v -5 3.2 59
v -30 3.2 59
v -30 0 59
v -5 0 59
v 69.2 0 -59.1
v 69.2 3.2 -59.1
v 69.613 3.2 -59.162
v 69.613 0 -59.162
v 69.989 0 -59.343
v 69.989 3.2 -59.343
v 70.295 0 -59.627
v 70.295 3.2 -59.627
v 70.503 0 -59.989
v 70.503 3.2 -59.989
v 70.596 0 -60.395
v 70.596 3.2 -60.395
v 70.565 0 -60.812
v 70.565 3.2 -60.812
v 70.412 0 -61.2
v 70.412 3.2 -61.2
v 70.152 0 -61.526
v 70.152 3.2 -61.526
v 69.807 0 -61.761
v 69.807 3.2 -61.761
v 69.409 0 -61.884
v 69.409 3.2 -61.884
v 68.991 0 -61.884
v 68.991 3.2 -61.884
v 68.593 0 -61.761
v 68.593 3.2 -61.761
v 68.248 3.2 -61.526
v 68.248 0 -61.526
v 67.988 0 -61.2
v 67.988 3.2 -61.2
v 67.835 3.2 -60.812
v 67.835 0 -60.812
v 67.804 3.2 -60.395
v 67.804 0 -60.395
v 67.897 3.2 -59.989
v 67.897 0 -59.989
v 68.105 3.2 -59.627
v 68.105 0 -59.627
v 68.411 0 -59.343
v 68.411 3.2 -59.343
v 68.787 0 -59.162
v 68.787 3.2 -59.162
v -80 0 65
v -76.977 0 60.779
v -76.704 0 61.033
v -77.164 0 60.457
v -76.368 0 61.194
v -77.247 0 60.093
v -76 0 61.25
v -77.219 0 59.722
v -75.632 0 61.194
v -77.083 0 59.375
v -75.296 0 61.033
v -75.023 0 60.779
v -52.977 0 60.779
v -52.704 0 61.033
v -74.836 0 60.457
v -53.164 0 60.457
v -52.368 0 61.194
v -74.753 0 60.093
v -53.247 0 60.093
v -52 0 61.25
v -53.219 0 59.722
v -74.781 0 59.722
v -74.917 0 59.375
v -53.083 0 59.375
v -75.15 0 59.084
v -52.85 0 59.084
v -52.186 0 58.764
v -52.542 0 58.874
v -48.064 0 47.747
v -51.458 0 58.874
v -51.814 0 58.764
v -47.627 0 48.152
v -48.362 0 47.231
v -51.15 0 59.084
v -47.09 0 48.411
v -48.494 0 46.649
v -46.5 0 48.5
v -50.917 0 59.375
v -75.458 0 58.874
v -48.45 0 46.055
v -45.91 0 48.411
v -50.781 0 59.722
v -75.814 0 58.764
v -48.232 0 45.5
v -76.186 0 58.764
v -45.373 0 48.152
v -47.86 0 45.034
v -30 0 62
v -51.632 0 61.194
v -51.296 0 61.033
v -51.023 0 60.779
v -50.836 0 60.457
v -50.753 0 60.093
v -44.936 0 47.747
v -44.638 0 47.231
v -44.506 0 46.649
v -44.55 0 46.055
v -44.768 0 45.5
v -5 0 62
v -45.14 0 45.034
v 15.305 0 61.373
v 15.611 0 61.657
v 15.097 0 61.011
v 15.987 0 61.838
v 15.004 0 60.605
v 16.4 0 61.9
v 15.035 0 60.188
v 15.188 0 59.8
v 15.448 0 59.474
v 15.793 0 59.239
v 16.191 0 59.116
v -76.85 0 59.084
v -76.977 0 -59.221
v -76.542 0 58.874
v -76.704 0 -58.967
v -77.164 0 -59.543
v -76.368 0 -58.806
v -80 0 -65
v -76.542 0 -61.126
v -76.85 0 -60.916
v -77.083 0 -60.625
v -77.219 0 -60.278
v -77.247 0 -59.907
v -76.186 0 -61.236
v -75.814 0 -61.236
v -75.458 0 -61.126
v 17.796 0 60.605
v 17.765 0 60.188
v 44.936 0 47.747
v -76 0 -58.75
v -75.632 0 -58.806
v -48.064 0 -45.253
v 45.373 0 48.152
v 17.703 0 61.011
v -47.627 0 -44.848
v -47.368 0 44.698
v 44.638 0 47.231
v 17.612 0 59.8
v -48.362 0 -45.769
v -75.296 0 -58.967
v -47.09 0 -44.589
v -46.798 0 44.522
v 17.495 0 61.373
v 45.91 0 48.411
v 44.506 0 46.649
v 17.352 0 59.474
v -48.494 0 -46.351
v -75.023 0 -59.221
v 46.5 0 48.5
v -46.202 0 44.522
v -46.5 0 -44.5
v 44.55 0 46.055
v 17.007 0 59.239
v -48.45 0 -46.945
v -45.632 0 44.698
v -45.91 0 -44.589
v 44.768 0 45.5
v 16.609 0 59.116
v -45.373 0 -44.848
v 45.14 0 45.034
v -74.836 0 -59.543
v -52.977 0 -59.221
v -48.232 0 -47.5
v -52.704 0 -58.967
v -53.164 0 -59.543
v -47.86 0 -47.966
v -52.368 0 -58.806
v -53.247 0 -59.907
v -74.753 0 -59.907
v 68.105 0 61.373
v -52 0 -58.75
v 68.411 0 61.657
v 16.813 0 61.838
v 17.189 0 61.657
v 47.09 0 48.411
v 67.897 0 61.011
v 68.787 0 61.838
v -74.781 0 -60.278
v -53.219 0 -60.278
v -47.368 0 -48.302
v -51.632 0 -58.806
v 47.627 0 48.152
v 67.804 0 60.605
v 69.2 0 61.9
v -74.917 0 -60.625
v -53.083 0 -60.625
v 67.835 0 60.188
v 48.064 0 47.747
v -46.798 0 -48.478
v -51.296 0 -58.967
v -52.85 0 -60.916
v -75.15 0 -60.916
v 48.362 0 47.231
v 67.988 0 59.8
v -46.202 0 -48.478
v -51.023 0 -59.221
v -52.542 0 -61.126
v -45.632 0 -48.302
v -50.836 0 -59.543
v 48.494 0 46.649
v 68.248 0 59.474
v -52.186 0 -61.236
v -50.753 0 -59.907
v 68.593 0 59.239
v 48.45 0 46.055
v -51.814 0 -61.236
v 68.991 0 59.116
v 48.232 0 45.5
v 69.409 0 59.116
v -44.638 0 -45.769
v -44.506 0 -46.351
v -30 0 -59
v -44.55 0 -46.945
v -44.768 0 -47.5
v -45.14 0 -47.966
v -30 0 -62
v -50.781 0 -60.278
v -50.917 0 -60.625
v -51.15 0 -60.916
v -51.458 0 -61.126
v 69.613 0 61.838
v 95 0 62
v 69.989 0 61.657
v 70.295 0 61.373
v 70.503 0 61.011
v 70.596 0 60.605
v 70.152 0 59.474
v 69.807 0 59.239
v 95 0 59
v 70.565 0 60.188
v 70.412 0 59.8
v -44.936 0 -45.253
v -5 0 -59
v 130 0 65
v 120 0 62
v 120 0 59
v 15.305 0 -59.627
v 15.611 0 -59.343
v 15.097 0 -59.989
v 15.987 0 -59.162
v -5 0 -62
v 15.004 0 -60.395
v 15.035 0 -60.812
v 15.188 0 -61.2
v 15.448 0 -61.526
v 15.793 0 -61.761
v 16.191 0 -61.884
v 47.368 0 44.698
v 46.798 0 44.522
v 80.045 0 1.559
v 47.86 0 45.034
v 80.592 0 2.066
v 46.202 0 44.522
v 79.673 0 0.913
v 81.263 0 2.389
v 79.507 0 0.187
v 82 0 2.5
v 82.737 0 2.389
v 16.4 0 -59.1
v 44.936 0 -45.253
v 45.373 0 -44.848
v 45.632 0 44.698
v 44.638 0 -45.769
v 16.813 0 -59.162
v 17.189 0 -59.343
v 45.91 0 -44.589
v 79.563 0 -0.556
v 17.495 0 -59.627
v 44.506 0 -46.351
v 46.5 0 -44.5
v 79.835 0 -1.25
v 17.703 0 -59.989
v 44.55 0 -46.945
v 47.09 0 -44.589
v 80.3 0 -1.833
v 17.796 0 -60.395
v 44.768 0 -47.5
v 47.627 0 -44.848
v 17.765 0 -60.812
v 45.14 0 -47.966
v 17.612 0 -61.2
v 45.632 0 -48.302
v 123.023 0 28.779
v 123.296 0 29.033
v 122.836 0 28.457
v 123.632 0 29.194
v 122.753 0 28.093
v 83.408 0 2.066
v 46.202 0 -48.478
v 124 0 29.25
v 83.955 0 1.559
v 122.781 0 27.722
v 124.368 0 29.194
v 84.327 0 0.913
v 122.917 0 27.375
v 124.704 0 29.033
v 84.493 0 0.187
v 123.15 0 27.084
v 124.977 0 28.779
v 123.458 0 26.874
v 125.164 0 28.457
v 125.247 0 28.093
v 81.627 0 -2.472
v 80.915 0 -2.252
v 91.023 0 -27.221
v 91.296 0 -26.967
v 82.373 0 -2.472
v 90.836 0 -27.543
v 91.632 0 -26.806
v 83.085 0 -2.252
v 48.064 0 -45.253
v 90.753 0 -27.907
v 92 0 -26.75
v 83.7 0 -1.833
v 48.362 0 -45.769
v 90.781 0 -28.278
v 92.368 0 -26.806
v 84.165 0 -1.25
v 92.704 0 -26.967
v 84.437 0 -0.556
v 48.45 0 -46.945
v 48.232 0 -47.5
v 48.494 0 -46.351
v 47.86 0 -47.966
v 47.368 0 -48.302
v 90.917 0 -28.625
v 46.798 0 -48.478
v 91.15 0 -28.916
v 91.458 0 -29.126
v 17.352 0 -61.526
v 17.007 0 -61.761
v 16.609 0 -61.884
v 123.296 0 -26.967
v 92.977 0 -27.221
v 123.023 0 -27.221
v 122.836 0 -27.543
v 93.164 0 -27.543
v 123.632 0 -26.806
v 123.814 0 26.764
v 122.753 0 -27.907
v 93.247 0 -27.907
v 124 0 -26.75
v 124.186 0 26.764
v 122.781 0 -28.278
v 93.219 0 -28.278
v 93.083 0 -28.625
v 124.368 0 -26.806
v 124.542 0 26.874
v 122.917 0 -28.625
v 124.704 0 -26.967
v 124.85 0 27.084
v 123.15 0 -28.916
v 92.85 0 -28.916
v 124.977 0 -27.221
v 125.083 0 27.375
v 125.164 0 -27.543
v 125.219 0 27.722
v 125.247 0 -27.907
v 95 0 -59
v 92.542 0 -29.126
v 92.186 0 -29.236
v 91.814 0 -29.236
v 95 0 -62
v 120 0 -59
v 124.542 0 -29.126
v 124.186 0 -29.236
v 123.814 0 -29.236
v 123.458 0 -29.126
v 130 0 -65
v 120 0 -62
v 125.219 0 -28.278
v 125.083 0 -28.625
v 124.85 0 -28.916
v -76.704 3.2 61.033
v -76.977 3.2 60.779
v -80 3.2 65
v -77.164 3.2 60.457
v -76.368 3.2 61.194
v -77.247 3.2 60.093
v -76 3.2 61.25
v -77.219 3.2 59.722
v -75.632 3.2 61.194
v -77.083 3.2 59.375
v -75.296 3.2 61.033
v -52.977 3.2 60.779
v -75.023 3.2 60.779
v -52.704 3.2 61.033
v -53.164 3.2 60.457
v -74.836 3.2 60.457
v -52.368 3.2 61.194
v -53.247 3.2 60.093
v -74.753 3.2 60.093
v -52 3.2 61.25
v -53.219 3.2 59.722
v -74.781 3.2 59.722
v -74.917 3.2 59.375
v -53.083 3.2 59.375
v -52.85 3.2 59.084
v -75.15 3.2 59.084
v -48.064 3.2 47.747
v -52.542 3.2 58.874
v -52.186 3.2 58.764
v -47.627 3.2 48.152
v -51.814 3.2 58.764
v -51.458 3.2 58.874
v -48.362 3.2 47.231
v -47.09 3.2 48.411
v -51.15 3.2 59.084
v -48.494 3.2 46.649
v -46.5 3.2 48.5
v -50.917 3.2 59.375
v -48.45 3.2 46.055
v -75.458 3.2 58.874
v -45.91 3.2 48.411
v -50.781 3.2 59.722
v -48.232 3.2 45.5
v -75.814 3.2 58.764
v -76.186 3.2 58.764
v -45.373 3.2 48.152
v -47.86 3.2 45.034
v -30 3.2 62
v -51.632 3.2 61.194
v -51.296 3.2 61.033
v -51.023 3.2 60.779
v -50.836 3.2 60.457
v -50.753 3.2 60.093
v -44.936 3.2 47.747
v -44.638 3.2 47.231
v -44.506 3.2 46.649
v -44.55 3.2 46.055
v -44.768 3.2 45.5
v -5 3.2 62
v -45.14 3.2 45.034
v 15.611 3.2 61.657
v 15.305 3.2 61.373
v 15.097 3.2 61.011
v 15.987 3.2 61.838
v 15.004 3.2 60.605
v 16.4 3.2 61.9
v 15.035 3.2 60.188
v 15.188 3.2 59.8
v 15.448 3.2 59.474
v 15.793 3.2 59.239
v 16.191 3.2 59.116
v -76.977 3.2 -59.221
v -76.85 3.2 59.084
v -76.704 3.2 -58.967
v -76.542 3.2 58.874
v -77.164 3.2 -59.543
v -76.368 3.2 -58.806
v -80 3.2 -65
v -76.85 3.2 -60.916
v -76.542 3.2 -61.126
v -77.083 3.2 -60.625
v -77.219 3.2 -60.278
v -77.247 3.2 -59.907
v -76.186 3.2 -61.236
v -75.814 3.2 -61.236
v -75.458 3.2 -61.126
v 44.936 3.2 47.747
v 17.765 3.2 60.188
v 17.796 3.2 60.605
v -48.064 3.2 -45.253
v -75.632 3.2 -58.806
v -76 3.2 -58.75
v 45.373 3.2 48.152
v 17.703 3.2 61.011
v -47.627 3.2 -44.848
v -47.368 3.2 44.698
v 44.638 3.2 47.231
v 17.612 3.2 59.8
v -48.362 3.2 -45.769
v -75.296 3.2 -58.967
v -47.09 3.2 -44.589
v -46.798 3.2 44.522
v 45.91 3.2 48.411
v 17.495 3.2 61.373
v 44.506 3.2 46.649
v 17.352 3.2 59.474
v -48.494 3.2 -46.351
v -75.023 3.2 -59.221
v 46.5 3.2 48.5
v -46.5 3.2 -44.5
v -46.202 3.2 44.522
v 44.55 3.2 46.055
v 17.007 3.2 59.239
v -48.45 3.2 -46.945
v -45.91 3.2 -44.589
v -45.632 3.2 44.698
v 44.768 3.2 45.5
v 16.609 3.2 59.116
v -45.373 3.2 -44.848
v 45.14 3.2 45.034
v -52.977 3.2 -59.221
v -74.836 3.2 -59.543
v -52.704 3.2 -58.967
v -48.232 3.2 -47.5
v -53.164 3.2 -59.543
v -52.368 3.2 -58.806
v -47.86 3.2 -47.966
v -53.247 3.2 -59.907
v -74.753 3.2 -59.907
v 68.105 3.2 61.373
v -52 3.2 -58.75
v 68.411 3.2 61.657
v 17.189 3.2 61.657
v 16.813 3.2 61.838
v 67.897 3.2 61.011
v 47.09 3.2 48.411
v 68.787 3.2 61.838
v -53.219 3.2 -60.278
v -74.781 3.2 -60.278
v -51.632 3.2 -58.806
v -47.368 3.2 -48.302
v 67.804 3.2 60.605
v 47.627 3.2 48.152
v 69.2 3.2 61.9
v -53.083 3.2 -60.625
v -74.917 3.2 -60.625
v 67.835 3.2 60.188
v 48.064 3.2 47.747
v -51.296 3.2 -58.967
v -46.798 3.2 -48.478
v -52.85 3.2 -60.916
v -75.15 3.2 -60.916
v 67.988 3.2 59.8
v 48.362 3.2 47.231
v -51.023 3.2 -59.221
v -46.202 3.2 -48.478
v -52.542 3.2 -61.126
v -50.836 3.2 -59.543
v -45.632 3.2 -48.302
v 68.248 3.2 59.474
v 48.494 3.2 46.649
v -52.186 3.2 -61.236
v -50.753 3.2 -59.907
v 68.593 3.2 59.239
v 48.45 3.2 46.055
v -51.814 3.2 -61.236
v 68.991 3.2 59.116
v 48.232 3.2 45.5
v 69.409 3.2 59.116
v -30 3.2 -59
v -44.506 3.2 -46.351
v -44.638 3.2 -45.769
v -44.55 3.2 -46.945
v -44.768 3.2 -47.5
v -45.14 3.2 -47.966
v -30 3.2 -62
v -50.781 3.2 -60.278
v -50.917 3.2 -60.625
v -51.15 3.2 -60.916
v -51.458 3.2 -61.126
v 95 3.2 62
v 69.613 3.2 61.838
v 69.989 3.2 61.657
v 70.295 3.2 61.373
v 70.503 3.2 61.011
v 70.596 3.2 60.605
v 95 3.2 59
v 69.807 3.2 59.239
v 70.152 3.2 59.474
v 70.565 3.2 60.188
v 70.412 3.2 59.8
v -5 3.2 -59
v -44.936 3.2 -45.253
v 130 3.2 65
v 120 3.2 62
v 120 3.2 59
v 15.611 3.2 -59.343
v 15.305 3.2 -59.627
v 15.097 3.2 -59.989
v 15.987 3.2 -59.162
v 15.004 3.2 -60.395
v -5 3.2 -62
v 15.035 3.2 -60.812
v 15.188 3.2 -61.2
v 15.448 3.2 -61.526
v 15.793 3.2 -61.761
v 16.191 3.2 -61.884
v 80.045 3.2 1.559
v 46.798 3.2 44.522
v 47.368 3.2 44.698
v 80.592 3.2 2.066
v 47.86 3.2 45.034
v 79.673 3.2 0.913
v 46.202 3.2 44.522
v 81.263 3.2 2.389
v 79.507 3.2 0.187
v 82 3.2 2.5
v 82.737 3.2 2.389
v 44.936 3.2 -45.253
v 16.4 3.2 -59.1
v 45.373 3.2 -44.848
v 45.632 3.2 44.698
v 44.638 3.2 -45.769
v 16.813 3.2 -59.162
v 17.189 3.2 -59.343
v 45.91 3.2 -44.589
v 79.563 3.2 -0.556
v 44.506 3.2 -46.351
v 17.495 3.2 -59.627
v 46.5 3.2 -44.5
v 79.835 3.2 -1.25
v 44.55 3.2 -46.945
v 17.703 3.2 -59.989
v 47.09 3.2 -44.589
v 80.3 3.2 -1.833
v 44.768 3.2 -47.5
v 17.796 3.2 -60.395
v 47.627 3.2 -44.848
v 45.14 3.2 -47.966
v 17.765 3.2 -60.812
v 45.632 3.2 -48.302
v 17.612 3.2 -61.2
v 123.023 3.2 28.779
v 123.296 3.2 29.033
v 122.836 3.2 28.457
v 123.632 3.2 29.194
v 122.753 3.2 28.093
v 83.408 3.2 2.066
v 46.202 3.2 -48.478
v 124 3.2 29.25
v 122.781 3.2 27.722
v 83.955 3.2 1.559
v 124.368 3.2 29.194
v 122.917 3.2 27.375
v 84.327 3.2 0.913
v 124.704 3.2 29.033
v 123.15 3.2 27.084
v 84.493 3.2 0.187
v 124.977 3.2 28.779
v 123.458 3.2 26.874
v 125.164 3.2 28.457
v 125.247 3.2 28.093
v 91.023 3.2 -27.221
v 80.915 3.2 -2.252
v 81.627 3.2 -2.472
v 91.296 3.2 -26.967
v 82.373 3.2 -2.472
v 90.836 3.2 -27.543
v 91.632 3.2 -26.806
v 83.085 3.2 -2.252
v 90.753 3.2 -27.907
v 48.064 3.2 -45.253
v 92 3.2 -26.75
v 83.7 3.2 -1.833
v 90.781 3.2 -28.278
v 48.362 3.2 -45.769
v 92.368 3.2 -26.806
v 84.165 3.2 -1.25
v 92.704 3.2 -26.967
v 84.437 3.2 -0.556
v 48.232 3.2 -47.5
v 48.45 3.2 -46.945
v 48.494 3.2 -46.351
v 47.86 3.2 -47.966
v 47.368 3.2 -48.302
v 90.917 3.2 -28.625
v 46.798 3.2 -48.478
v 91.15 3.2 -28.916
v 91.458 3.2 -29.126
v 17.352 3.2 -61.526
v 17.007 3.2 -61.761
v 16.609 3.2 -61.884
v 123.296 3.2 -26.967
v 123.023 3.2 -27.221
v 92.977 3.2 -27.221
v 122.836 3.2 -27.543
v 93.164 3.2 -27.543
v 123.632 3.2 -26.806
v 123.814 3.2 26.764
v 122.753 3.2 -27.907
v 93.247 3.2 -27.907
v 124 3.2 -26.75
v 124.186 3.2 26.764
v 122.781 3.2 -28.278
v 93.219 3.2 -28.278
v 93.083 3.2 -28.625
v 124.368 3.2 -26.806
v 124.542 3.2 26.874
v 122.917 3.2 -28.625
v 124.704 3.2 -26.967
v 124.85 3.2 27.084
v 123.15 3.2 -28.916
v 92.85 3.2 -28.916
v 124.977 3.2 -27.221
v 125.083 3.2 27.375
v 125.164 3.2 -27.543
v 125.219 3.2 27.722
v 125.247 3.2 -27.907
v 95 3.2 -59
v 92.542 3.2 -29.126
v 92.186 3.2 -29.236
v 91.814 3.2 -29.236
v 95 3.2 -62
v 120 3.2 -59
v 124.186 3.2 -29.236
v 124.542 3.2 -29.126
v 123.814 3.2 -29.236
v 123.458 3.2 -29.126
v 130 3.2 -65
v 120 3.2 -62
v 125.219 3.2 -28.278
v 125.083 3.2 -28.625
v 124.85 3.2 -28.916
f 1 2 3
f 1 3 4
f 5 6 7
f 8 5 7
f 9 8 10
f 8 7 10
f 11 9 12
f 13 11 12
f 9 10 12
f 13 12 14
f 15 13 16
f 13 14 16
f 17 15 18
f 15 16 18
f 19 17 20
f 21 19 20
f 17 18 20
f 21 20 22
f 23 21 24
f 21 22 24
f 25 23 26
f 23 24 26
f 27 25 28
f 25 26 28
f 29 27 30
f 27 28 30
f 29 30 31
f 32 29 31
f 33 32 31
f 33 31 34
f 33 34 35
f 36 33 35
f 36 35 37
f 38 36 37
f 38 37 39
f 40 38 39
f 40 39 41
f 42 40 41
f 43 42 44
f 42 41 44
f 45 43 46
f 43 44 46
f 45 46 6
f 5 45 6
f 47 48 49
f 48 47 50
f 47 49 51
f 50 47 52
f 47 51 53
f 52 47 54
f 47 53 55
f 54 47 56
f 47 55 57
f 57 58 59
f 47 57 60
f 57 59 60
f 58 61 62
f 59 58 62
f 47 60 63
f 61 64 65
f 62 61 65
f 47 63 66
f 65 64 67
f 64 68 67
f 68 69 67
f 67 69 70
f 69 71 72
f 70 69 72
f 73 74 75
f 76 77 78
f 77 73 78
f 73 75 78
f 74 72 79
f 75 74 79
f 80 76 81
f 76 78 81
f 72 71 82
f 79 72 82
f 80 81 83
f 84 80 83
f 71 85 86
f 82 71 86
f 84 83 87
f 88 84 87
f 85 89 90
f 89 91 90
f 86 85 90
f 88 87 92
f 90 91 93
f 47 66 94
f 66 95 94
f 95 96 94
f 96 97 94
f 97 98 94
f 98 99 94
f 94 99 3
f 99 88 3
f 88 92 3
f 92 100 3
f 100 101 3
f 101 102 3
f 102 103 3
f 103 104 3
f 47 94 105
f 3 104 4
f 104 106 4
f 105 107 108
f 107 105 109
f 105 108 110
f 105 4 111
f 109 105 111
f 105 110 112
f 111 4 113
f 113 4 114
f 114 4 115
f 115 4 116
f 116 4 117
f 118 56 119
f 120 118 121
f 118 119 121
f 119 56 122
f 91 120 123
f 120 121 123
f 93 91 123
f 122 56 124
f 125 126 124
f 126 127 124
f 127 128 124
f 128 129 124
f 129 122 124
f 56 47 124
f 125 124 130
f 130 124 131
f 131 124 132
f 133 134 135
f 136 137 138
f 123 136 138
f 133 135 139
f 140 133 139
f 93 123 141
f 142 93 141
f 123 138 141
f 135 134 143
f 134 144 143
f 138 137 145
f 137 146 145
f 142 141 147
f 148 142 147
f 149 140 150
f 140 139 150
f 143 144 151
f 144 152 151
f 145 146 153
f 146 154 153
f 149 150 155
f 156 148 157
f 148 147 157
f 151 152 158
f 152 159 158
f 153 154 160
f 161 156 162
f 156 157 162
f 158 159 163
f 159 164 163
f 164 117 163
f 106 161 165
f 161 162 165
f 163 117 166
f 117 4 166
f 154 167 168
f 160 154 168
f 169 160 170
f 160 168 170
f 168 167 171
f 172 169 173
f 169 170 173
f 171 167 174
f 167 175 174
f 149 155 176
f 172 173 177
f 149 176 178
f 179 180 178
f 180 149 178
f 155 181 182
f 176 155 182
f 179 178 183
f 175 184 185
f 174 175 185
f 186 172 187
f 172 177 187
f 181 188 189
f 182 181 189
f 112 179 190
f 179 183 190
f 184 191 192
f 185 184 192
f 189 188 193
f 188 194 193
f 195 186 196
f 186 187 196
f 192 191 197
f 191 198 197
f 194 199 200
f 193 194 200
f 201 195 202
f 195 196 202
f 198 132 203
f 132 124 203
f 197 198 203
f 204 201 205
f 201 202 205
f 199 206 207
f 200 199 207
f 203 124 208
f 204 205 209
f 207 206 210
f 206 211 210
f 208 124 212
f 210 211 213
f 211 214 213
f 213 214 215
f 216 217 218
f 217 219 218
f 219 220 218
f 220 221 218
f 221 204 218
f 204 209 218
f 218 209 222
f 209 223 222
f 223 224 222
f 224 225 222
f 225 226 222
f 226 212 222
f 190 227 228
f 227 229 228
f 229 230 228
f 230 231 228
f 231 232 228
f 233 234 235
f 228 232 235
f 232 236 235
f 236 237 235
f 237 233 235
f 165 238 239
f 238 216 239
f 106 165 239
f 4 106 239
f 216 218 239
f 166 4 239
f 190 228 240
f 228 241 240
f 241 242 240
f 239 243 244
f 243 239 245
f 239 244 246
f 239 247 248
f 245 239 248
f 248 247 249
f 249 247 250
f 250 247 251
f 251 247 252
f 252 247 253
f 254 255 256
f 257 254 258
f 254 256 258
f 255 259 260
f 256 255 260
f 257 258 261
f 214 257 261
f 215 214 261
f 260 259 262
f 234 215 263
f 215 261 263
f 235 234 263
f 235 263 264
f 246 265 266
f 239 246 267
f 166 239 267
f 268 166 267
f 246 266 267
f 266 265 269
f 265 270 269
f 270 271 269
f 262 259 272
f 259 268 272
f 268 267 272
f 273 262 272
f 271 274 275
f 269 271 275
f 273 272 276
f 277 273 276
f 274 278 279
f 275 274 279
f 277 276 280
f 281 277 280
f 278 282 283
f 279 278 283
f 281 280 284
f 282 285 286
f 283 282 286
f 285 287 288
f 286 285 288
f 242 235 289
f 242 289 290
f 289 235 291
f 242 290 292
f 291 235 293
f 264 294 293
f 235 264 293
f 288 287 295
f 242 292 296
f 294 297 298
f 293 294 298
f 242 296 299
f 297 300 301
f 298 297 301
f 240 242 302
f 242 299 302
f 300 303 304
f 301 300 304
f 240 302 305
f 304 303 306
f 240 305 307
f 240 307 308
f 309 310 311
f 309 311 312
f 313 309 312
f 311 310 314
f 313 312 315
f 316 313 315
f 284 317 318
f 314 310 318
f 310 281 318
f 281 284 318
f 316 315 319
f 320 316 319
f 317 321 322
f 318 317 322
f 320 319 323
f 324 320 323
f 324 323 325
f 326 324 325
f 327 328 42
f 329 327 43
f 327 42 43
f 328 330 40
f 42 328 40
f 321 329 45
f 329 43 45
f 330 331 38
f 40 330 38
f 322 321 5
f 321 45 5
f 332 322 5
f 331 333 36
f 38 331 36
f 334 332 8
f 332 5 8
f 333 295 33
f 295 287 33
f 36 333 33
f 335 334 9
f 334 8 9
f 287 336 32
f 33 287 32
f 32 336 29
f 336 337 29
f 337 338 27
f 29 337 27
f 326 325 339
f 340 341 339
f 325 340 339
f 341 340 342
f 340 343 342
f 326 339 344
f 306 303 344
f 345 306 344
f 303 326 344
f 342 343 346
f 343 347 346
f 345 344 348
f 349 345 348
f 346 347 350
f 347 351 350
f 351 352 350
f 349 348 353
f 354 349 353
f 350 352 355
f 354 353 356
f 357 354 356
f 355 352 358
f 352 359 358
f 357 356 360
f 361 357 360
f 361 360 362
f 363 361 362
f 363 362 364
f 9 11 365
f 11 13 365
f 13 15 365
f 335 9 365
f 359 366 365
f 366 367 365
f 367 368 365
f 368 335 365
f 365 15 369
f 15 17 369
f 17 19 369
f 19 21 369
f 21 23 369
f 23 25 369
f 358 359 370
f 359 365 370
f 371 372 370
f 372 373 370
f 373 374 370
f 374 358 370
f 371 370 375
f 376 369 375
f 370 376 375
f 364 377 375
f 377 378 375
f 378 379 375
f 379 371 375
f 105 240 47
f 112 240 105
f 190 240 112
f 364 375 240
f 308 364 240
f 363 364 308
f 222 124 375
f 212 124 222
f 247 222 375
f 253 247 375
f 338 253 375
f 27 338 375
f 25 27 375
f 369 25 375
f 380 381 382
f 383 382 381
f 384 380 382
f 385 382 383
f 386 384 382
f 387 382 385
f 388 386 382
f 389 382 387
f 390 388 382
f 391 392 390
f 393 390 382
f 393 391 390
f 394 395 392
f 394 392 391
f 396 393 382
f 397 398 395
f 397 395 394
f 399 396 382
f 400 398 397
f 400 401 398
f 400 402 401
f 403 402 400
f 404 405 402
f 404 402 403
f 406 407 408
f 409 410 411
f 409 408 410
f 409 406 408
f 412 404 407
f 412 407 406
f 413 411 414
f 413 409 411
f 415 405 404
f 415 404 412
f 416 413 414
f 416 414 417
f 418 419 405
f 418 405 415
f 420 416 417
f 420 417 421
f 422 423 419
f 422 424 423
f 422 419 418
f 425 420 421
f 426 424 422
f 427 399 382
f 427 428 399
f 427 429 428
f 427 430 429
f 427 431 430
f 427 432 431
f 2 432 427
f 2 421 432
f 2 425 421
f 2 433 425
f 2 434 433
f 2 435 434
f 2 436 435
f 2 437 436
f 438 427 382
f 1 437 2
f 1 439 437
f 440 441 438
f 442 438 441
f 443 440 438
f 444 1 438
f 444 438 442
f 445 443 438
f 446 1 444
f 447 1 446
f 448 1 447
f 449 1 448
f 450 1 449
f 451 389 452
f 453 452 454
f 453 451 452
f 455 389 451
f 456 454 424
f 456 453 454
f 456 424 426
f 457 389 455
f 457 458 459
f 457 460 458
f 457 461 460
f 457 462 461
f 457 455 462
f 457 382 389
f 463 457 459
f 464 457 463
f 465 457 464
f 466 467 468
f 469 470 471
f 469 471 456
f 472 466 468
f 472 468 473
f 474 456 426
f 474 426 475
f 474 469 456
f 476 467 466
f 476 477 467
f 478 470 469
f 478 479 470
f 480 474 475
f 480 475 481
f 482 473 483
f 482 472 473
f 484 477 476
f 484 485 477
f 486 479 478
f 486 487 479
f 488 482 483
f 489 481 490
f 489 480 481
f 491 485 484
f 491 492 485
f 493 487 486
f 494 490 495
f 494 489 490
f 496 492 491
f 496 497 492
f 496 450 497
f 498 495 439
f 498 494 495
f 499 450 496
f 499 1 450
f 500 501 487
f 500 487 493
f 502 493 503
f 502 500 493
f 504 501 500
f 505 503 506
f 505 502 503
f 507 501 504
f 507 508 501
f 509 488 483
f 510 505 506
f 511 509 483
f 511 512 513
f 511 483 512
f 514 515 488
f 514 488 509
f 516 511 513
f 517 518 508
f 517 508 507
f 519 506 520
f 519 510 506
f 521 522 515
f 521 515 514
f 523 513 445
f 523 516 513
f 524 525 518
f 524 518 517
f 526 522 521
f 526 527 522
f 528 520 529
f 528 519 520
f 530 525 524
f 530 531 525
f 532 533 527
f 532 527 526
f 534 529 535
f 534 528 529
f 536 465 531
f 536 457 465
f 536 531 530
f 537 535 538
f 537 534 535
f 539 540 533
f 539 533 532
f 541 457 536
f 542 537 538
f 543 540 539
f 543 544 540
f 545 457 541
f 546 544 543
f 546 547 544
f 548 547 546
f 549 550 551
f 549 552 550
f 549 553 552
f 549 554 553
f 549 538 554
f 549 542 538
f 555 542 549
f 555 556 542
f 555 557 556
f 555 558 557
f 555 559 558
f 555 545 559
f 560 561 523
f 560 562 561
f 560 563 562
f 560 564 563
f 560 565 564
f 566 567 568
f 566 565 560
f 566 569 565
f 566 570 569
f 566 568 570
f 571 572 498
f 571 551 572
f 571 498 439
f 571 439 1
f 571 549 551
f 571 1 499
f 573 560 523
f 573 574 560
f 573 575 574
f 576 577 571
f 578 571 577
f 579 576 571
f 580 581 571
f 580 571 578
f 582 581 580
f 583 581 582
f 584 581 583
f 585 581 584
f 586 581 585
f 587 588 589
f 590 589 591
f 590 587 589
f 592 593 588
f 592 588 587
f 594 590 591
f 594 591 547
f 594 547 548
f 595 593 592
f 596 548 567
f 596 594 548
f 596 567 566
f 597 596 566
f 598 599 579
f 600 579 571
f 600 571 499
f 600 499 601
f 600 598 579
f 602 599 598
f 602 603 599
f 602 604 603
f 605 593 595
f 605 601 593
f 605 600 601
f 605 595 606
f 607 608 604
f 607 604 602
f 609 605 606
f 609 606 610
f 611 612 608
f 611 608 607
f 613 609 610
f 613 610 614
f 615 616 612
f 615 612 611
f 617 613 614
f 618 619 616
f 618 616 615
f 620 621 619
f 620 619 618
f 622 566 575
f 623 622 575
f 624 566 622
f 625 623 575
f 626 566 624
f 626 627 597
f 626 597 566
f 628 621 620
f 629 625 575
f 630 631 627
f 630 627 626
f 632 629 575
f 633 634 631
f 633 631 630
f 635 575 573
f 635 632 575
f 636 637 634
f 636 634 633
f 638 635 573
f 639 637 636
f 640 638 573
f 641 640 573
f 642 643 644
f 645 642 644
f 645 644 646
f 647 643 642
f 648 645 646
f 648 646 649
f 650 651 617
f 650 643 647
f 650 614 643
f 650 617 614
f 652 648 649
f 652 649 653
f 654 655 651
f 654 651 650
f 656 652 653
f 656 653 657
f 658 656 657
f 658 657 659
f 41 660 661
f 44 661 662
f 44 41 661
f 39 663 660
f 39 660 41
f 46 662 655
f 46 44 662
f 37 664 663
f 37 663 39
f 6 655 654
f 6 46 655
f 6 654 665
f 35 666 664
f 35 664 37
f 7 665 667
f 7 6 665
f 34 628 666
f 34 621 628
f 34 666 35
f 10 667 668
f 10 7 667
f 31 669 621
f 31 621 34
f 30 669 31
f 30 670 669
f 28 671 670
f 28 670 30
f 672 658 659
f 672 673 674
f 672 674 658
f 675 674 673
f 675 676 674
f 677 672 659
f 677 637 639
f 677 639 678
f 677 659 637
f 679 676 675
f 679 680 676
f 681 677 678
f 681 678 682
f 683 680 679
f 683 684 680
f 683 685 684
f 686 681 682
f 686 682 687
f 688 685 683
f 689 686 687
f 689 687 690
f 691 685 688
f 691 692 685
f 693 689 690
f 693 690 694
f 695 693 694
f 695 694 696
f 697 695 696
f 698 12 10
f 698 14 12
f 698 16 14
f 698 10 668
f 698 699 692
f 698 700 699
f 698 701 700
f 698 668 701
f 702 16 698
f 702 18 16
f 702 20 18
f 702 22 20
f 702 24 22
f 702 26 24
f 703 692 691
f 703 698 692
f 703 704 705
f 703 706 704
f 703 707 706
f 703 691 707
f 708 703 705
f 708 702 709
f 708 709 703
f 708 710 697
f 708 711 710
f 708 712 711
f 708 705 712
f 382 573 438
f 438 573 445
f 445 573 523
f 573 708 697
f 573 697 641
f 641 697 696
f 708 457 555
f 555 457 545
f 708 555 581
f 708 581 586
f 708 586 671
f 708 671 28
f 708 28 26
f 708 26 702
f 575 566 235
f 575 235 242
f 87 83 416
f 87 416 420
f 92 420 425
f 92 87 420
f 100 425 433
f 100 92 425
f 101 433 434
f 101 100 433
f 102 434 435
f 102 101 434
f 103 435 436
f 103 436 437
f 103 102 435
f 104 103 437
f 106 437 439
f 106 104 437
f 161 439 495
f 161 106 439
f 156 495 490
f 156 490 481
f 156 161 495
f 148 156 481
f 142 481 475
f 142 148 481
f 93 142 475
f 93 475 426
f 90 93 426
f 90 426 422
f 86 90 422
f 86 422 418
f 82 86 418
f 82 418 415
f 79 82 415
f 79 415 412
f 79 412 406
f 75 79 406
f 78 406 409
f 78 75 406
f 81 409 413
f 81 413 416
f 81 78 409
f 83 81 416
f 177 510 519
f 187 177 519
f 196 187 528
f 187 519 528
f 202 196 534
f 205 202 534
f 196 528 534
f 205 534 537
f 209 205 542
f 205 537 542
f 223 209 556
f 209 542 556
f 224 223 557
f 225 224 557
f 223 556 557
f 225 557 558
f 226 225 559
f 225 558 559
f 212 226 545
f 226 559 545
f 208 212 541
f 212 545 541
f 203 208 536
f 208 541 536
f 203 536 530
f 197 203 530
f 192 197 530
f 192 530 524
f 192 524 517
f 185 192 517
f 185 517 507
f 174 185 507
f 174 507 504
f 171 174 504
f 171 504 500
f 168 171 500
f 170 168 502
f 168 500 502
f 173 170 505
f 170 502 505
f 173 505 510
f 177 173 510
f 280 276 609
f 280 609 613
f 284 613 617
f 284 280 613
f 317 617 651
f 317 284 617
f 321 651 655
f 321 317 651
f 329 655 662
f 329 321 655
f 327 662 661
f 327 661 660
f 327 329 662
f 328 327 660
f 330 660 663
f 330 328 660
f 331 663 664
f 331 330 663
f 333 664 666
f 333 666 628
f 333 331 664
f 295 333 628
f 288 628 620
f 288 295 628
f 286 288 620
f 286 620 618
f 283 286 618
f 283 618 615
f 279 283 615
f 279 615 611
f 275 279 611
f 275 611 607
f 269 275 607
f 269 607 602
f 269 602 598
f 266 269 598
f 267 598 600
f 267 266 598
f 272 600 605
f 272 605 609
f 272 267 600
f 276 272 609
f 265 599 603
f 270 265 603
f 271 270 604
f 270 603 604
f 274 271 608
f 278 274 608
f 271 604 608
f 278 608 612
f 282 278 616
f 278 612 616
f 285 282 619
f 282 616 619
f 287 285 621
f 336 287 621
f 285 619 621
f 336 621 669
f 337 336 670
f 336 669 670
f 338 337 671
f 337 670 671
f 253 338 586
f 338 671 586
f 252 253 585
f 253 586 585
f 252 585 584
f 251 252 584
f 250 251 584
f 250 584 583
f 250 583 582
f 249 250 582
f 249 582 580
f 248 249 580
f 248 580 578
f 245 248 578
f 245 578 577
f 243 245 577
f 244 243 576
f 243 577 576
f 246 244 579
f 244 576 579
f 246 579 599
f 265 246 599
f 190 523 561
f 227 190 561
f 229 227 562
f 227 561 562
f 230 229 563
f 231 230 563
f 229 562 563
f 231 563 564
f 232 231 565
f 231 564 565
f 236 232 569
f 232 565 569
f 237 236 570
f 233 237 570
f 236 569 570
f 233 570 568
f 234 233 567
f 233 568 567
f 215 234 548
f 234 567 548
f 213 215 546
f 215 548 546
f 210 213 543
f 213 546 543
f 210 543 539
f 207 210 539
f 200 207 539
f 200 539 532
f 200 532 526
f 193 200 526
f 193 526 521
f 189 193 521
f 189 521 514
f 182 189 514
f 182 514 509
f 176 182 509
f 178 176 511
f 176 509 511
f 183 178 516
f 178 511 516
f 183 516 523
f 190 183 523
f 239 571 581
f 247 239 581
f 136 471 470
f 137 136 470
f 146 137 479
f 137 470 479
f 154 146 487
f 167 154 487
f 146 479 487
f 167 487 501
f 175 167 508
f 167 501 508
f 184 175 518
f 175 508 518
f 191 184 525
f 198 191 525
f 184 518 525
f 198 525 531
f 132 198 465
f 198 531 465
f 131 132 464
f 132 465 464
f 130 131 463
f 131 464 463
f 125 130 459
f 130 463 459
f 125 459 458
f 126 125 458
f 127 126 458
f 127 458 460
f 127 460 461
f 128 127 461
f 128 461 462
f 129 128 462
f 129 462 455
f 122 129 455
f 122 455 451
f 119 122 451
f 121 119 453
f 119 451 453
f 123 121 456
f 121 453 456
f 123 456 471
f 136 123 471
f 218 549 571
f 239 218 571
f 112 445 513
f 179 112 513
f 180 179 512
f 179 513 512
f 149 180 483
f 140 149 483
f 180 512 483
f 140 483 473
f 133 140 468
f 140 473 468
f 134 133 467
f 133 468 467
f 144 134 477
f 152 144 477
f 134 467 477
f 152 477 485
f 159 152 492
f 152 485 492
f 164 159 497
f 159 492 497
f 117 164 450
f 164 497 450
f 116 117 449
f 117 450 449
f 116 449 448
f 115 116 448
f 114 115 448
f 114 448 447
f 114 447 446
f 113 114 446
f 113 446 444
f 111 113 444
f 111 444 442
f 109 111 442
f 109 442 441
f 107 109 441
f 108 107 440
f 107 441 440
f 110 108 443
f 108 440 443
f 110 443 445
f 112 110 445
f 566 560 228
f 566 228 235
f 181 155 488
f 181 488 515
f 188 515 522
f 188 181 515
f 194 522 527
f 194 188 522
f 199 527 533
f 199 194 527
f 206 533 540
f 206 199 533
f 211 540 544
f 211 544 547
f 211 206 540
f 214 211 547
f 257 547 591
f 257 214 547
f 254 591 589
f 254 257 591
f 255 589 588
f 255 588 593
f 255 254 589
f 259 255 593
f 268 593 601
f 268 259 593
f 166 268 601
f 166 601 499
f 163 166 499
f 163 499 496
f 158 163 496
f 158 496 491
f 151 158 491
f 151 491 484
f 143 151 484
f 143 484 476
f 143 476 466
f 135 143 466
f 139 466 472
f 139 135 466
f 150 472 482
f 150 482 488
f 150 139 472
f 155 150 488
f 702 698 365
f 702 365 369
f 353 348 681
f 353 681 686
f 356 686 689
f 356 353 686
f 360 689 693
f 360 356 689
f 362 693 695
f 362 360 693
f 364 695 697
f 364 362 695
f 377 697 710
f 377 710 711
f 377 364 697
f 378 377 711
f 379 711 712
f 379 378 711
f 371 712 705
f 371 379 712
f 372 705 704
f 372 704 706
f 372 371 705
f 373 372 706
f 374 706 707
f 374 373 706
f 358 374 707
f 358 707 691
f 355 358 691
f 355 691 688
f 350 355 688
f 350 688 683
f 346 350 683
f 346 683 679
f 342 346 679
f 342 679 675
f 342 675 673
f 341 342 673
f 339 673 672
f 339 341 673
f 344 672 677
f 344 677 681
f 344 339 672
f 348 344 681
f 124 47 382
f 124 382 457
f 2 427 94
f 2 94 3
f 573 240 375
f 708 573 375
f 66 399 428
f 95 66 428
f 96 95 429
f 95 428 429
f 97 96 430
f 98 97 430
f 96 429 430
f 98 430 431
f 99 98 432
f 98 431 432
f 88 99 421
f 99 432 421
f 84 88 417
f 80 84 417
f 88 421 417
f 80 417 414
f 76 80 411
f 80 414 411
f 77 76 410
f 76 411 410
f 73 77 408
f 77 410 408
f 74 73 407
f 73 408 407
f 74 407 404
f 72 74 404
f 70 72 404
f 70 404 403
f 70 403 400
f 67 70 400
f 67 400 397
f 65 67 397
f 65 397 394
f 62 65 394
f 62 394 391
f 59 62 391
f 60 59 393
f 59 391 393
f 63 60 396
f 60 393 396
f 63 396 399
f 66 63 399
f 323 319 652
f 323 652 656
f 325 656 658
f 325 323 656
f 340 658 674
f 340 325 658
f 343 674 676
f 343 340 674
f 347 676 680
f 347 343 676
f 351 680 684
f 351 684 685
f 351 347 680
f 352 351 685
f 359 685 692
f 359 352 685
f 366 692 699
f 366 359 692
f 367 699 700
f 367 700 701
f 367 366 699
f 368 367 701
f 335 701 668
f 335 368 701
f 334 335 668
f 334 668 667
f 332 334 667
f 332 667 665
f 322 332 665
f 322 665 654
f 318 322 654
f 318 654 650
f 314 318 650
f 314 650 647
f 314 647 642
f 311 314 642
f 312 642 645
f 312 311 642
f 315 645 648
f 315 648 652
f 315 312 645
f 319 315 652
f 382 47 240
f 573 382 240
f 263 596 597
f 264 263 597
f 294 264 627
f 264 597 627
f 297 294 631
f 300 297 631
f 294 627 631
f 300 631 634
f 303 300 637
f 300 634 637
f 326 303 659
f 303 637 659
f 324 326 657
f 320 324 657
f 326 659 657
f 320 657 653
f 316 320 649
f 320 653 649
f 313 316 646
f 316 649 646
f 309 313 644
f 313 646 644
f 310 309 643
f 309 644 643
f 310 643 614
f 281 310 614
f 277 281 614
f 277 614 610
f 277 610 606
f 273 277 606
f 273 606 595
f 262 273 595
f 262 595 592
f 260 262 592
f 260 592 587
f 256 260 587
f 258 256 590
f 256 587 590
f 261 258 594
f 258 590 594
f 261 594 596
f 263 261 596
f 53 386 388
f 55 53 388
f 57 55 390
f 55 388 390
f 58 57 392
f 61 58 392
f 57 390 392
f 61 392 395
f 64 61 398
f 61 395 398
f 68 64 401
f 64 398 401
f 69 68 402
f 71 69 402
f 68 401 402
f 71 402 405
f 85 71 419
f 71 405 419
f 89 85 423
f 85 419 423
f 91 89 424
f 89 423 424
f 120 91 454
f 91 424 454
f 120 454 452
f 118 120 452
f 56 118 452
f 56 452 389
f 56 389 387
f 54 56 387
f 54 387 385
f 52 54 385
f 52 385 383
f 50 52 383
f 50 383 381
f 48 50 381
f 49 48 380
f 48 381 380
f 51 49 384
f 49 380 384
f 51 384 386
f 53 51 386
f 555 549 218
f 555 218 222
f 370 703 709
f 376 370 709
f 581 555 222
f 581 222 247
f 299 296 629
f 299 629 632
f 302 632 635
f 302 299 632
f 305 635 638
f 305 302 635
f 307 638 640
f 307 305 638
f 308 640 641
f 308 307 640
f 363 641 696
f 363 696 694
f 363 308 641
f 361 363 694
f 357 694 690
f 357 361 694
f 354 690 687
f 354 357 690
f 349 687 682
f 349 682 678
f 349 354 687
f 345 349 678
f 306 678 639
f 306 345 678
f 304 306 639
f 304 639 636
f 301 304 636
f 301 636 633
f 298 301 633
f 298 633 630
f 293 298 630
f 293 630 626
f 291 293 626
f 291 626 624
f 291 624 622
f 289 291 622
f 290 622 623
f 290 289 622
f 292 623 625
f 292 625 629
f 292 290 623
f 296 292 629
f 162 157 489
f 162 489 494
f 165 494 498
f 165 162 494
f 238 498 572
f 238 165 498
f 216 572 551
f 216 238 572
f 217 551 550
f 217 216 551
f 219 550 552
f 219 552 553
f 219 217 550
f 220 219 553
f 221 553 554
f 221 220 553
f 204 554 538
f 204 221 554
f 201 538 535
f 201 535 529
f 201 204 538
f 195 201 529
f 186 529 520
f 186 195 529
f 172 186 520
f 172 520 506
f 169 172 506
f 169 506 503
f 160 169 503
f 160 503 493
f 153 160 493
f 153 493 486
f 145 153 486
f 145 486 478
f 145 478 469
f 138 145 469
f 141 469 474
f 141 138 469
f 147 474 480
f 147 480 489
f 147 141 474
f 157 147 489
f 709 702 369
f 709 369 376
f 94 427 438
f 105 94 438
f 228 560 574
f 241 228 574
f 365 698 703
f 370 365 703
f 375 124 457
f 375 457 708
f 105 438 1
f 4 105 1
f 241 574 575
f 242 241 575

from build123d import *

# Parameters (mm, degrees)
SKETCH2_W         = 210
SKETCH2_H         = 130
SKETCH2_R         = 2
SKETCH2_R_2       = 1.25
MAIN_DEPTH        = 3.2
SKETCH3_R         = 1.25
MOTOR_MOUNT_DEPTH = 3.2
SKETCH4_R         = 1.4
SKETCH4_W         = 25
SKETCH4_H         = 3
SIDE_HOLES_DEPTH  = 3.2
SKETCH5_R         = 2.5
BACK_WHEEL_DEPTH  = 3.2


with BuildPart() as part:
    # Sketch2 → main (new body)
    with BuildSketch(Plane(origin=(0, 0, 0), x_dir=(1, 0, 0), z_dir=(0, 1, 0))):
        with Locations((25, 0)):
            Rectangle(SKETCH2_W, SKETCH2_H)
        with Locations(Location((-46.5, 46.5, 0), (0, 0, 270))):
            Circle(SKETCH2_R, mode=Mode.SUBTRACT)
        with Locations(Location((46.5, 46.5, 0), (0, 0, 270))):
            Circle(SKETCH2_R, mode=Mode.SUBTRACT)
        with Locations(Location((-46.5, -46.5, 0), (0, 0, 270))):
            Circle(SKETCH2_R, mode=Mode.SUBTRACT)
        with Locations(Location((46.5, -46.5, 0), (0, 0, 270))):
            Circle(SKETCH2_R, mode=Mode.SUBTRACT)
        with Locations(Location((92, 28, 0), (0, 0, 270))):
            Circle(SKETCH2_R_2, mode=Mode.SUBTRACT)
        with Locations(Location((124, 28, 0), (0, 0, 270))):
            Circle(SKETCH2_R_2, mode=Mode.SUBTRACT)
        with Locations(Location((124, -28, 0), (0, 0, 270))):
            Circle(SKETCH2_R_2, mode=Mode.SUBTRACT)
    extrude(amount=MAIN_DEPTH)

    # Sketch3 → motor mount (cut)
    with BuildSketch(Plane(origin=(0, 3.2, 0), x_dir=(1, 0, 0), z_dir=(0, 1, 0))):
        with Locations(Location((-76, -60, 0), (0, 0, 270))):
            Circle(SKETCH3_R)
        with Locations(Location((-52, -60, 0), (0, 0, 270))):
            Circle(SKETCH3_R)
        with Locations(Location((-52, 60, 0), (0, 0, 270))):
            Circle(SKETCH3_R)
        with Locations(Location((-76, 60, 0), (0, 0, 270))):
            Circle(SKETCH3_R)
    extrude(amount=-MOTOR_MOUNT_DEPTH, mode=Mode.SUBTRACT)

    # Sketch4 → side holes (cut)
    with BuildSketch(Plane(origin=(0, 3.2, 0), x_dir=(1, 0, 0), z_dir=(0, 1, 0))):
        with Locations(Location((16.4, -60.5, 0), (0, 0, 270))):
            Circle(SKETCH4_R)
        with Locations(Location((69.2, -60.5, 0), (0, 0, 270))):
            Circle(SKETCH4_R)
        with Locations(Location((69.2, 60.5, 0), (0, 0, 270))):
            Circle(SKETCH4_R)
        with Locations(Location((16.4, 60.5, 0), (0, 0, 270))):
            Circle(SKETCH4_R)
        with Locations((-17.5, -60.5)):
            Rectangle(SKETCH4_W, SKETCH4_H)
        with Locations((107.5, -60.5)):
            Rectangle(SKETCH4_W, SKETCH4_H)
        with Locations((107.5, 60.5)):
            Rectangle(SKETCH4_W, SKETCH4_H)
        with Locations((-17.5, 60.5)):
            Rectangle(SKETCH4_W, SKETCH4_H)
    extrude(amount=-SIDE_HOLES_DEPTH, mode=Mode.SUBTRACT)

    # Sketch5 → back wheel (cut)
    with BuildSketch(Plane(origin=(0, 3.2, 0), x_dir=(1, 0, 0), z_dir=(0, 1, 0))):
        with Locations(Location((82, 0, 0), (0, 0, 270))):
            Circle(SKETCH5_R)
    extrude(amount=-BACK_WHEEL_DEPTH, mode=Mode.SUBTRACT)


solid = part.part
